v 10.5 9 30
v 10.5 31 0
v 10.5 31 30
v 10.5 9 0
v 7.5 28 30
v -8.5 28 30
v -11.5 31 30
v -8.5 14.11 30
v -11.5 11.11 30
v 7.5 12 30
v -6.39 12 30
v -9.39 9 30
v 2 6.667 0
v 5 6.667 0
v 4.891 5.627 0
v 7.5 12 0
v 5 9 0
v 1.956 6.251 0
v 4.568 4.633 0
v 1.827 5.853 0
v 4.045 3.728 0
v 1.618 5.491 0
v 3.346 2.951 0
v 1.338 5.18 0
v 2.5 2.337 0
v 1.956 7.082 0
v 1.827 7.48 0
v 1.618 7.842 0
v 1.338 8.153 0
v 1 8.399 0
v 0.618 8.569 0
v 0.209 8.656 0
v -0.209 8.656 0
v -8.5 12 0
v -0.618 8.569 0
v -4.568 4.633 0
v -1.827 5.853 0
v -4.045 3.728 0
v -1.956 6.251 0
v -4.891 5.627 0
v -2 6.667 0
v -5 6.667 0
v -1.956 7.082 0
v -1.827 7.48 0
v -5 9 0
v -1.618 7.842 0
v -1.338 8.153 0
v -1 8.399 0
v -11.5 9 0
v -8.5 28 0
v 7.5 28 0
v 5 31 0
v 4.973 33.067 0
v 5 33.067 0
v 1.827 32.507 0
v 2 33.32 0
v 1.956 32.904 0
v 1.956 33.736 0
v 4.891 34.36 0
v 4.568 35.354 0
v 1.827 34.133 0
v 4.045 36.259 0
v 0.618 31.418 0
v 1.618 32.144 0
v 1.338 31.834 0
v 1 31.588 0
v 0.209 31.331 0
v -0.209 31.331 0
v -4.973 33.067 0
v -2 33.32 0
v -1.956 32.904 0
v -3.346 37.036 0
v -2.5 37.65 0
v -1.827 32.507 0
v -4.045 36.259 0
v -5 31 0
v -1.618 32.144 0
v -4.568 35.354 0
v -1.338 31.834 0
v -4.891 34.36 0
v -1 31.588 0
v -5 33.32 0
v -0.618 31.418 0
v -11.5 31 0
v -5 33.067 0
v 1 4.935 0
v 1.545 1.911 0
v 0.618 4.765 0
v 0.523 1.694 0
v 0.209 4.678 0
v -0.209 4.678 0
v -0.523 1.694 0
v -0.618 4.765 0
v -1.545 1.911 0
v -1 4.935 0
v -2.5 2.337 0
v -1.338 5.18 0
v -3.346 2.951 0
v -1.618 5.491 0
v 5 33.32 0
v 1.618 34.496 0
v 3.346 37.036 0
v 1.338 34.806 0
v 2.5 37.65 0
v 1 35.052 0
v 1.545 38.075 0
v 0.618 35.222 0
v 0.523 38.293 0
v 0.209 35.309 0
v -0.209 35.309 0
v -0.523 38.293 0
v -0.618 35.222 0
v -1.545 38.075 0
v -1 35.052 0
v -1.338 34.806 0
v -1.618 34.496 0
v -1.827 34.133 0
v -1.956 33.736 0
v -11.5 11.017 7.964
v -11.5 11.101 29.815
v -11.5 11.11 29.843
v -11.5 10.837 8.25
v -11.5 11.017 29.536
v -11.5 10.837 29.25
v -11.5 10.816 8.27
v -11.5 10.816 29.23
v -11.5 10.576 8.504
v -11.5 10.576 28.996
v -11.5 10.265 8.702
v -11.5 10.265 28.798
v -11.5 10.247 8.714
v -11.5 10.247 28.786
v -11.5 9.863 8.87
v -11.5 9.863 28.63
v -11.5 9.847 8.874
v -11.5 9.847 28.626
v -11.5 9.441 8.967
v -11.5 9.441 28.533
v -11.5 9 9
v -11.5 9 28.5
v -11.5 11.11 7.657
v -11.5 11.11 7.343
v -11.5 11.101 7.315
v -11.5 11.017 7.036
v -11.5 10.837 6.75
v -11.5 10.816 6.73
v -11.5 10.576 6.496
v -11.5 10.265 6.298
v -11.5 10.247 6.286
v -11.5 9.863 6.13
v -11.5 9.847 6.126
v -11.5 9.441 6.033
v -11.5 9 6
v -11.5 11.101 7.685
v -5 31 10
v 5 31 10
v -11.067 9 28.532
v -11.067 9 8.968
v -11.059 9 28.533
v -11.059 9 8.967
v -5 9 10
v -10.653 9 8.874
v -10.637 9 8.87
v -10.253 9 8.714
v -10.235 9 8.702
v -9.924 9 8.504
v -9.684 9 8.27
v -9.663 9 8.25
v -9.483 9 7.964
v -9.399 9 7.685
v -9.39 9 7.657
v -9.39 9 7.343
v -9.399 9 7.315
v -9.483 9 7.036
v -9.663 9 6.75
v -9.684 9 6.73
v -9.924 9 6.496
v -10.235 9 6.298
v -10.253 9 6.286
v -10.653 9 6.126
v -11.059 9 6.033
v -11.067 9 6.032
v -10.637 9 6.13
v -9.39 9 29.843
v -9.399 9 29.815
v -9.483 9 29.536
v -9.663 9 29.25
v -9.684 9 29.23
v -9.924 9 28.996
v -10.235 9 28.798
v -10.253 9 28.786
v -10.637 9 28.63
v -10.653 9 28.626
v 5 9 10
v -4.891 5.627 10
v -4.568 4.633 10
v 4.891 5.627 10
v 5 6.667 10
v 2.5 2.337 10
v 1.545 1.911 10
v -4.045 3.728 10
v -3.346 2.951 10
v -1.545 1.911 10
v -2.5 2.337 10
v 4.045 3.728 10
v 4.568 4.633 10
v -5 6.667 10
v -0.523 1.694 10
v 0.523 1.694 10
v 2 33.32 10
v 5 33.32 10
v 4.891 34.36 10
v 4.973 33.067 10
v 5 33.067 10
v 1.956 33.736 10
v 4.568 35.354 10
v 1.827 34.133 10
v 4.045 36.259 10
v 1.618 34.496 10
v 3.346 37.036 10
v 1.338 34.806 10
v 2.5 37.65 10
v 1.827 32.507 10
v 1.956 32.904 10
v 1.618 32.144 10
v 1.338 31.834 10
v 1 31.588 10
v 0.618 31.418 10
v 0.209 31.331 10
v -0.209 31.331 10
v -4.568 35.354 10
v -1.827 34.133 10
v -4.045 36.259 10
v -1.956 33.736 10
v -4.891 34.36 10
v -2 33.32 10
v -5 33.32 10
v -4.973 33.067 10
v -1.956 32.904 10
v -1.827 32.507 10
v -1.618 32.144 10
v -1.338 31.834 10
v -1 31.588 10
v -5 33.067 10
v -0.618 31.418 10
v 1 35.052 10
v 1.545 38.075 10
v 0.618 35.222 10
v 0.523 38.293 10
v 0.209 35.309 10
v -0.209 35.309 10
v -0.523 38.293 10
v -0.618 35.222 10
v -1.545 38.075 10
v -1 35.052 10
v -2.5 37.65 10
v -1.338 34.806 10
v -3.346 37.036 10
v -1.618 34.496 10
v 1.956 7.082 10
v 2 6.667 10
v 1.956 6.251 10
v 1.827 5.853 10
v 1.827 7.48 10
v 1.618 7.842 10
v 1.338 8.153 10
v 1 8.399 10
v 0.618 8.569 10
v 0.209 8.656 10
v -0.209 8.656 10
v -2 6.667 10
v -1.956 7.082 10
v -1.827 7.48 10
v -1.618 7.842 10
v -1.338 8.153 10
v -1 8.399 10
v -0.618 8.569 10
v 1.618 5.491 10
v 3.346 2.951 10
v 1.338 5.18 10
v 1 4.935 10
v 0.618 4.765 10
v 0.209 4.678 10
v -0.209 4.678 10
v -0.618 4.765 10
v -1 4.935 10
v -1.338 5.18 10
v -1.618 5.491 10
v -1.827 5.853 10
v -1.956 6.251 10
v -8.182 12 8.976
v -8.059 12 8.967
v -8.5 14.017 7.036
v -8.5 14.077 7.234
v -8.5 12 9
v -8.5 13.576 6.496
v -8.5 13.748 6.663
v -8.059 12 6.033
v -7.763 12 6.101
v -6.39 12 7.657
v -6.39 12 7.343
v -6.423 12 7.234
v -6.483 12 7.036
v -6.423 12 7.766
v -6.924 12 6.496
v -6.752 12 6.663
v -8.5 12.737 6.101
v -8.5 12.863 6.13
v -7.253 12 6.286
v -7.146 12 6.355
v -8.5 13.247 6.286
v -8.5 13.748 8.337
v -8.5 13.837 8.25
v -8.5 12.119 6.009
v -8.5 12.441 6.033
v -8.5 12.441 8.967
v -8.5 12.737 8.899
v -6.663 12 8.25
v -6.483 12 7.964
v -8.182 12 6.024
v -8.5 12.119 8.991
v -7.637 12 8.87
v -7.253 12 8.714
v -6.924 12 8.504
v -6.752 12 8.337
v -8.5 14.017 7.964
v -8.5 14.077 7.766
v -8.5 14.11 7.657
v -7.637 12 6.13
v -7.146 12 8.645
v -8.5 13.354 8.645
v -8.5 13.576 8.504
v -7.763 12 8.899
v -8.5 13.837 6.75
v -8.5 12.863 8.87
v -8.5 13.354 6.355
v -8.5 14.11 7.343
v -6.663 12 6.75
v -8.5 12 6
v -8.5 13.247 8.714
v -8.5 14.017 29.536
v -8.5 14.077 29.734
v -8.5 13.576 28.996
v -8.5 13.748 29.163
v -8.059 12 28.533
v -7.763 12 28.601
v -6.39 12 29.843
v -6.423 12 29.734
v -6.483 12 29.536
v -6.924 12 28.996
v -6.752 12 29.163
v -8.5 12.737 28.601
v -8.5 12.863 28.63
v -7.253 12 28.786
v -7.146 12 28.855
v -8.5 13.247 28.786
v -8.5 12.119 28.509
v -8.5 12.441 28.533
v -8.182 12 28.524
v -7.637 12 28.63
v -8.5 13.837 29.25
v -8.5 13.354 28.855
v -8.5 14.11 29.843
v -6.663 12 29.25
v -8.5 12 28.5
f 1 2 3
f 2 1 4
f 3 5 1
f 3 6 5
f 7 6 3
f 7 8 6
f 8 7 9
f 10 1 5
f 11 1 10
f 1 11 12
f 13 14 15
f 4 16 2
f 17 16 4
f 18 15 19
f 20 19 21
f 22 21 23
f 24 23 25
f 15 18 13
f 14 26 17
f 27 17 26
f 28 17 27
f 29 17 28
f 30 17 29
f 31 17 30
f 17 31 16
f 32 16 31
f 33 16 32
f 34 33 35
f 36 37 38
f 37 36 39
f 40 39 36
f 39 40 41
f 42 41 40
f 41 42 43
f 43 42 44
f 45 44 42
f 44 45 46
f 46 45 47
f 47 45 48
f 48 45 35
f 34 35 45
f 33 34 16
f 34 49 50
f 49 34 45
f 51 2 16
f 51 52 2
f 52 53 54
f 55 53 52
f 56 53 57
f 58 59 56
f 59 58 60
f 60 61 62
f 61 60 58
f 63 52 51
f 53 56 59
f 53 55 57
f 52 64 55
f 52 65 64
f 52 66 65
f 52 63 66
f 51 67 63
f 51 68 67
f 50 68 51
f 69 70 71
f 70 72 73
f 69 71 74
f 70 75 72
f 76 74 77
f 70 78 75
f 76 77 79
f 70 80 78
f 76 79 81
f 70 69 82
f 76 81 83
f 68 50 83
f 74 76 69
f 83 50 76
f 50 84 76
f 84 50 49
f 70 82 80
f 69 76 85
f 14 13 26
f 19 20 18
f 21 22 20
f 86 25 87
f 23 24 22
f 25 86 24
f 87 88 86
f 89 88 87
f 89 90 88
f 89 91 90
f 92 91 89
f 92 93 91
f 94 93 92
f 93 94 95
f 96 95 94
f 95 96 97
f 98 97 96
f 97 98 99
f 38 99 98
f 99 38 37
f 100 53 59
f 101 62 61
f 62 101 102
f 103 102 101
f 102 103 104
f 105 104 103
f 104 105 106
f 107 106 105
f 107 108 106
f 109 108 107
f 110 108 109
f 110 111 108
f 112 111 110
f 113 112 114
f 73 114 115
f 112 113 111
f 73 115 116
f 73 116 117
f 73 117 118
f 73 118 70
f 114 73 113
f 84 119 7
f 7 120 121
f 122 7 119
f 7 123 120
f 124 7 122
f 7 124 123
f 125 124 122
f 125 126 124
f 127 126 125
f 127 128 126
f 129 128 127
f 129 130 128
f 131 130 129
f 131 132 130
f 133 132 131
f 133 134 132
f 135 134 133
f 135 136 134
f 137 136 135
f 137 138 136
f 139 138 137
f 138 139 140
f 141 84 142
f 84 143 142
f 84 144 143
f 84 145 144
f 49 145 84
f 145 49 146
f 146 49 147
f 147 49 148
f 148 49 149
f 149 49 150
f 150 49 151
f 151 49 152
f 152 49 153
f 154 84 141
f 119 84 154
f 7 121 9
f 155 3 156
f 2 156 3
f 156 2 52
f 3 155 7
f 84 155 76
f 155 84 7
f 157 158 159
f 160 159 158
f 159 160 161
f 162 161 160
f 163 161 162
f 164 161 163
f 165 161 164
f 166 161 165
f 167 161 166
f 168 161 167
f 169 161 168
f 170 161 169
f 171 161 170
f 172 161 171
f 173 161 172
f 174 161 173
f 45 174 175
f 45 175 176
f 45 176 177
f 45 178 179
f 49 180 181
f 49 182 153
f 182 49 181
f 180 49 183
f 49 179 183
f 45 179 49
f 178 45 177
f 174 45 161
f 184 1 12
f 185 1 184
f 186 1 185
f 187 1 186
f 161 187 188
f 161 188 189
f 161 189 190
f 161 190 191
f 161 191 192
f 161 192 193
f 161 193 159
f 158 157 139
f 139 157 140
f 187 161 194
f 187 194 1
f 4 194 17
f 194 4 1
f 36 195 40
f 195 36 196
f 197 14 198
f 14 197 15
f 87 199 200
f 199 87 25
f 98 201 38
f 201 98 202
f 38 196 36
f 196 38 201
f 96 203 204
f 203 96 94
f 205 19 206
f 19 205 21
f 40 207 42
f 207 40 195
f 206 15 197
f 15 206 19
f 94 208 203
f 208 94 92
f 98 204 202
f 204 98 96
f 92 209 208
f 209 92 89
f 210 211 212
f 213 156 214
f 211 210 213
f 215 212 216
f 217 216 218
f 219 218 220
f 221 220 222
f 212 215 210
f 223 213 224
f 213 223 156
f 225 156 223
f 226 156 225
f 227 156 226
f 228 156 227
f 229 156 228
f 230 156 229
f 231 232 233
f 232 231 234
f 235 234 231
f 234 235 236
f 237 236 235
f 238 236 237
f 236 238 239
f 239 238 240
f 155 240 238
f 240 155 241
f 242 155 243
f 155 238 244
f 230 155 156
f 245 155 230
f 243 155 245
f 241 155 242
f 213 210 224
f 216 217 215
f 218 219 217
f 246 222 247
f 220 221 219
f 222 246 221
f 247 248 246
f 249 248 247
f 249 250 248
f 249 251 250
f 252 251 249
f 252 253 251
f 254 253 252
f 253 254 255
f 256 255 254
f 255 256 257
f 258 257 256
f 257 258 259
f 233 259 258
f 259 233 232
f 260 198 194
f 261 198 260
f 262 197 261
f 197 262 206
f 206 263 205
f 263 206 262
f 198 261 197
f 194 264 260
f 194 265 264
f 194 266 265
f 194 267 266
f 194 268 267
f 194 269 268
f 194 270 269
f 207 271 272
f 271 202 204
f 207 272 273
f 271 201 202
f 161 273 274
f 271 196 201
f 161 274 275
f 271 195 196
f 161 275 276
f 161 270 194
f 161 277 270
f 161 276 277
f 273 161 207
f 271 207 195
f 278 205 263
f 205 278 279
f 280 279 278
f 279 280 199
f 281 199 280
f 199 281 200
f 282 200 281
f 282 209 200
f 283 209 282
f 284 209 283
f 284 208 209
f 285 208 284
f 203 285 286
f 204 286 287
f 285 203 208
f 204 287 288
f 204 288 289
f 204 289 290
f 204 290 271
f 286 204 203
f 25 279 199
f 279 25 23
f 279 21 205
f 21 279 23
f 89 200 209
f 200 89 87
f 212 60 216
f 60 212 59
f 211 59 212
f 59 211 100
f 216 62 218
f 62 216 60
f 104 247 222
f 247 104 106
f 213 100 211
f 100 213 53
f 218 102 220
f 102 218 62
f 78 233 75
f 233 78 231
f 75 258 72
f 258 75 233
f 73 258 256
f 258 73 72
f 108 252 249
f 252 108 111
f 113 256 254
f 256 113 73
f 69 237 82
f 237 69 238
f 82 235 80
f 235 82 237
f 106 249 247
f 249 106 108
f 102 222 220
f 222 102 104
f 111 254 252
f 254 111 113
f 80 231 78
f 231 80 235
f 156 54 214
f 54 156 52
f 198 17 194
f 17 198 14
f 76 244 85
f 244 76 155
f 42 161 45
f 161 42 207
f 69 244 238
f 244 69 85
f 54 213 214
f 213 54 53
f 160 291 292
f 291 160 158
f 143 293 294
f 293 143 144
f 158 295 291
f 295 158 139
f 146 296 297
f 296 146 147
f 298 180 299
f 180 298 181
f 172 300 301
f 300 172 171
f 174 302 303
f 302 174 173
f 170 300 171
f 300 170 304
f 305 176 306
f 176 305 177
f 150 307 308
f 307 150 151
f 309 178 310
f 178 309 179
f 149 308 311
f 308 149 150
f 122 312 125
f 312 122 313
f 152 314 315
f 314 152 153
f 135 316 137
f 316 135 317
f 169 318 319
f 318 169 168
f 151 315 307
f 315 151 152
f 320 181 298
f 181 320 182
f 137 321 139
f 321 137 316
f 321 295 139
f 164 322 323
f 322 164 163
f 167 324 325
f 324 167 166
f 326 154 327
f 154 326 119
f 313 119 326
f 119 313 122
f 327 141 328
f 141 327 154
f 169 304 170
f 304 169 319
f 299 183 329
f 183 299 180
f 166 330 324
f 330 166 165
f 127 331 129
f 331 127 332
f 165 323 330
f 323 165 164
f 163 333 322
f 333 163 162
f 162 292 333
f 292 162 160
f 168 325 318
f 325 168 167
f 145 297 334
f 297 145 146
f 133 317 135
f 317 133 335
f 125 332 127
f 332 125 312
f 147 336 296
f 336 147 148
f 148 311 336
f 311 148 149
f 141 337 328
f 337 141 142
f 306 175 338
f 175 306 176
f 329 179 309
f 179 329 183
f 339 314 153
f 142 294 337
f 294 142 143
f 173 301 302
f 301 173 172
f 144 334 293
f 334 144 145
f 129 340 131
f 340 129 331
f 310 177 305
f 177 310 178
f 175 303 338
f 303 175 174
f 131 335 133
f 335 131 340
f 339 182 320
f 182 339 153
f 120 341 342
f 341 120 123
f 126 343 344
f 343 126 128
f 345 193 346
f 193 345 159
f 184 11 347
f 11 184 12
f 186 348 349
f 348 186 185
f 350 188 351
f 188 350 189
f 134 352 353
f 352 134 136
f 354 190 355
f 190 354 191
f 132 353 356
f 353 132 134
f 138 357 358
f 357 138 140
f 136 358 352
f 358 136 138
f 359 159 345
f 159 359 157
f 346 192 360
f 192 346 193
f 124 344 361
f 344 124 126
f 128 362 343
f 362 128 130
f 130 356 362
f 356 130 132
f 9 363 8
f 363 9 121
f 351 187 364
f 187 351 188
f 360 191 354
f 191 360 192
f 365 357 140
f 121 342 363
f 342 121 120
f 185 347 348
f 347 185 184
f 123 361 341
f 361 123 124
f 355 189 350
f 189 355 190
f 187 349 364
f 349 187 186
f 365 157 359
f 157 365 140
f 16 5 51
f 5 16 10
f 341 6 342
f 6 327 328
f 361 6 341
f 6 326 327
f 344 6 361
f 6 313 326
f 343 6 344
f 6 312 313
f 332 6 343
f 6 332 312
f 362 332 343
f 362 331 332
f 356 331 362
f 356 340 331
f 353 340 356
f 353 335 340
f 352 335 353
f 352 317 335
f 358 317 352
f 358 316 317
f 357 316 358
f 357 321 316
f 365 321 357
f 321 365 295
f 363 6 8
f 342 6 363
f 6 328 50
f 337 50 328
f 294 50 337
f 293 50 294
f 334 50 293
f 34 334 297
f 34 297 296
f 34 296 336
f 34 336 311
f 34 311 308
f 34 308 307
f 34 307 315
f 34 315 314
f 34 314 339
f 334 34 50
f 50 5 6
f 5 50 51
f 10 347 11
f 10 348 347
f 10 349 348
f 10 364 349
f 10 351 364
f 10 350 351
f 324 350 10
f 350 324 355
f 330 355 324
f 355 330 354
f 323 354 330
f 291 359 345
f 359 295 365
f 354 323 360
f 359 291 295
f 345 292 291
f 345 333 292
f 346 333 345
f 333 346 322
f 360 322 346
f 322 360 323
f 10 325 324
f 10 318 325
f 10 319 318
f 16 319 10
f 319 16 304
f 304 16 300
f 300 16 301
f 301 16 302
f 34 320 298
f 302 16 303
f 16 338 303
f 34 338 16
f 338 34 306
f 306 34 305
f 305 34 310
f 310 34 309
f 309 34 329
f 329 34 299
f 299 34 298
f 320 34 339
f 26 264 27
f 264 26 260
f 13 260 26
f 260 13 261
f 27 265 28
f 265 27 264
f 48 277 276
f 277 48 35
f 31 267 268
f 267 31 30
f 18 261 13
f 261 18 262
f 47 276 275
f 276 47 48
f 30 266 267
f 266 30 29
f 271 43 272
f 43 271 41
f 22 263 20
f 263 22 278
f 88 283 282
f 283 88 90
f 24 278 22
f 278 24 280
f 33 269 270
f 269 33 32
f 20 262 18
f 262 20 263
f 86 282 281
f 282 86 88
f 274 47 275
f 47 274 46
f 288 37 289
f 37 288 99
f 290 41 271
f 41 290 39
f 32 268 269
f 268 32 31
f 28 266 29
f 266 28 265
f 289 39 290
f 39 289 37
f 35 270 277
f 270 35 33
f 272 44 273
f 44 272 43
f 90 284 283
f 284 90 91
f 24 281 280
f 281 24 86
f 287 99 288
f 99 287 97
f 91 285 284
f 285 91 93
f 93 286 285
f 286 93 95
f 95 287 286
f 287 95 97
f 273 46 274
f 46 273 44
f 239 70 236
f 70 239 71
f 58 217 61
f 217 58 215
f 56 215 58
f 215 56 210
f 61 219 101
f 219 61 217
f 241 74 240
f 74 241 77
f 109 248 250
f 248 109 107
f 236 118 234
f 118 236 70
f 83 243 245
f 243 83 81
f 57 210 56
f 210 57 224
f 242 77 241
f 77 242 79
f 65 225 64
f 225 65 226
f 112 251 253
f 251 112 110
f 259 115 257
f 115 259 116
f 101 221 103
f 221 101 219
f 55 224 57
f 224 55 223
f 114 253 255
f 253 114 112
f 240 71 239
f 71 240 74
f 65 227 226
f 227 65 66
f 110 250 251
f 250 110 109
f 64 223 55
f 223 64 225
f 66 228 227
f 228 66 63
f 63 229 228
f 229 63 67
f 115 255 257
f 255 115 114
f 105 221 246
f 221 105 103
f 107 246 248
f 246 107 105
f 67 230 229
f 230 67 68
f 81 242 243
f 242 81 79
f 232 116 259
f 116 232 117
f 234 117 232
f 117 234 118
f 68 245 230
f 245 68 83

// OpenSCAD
// file: config.scad
//This REALLY REALLY needs to get organized. I will start sorting through it ASAP 

//Vars for the fram vertex. This is still kind of confusing. File is broke sometimes. I would watch this in preview before trusting these values.
framerodsize = 8.5;
framerodtap =7; // we use this one in the y motor for the top rod that gets tapped as well
vertexwall = 3;
vertexthick = framerodsize*2 + vertexwall*2; // I would say leave this alone. 
triangle= 60;
mirror=false;

// vars for the y motor mount
vertexhole = 8; //the diameter of the vertex hole in whosawhatasis vertex. Really important these values match.
partthick =9;
wallmulti = 2; //the wall thickness multiplier
motorwallmulti = 2.3; //multiplier for the motor holes because you might want them thicker
centerwallmulti = 1.5; //multiplier for the center hole because you might want them thinner
nemasize = 1.7;
motorscrew = 4; //diameter of the motor attachment screw
motorcenter = 24; //center hole size for the motor

//Top piece vars
nemasize= 1.7;
motorwallmulti= 1.9;
motorscrew = 4;
motorcenter= 23;
centerwallmulti = 1.7;
motorbody = 43;

partthick = 8;
toprodbefore =7;
toproddia = 8.5;
toprodwall = 4;
toprodspacing = 72;
siderodtap = 7;
sideroddia = 8;
siderodwall = 4;
angle = 60;

zsmoothdia =8;

xrodspacing = 55; //rod spacing center to center
xroddia = 8; //rod diamter
nemasize = 1.7;
znutdia = 14.8;
znuth = 7; //znut height
zroddia = 8;
nutwall = 3; //wall thickness
zbeforetapdia = 7.5; 
bushingod = 16;
bushingtower =xroddia+nutwall*sin(45)+xrodspacing ;
towergap= 10;
wallmulti = 1.5;
motorwallmulti = 1.7;
motorscrew =4;
partthick = 7.5; //thickness of the motor mount
centerwallmulti = 1.5; // center motor hole multi
motorcenter = 24;
supportwidth = 17;
$fn = 30;

//xcarriage 
carriagewidth = 60;
bushingwall = 3;
backwall = 5;
tools = 2;
tool1dia = 16;
tool2dia = 16;
adapterholedia = 4;
platformthick = 10;
platformextension = 40; 
pulleydia = 12;
beltthick = 2;
clampthick = 4;
clampholedia = 4;

//pen holder 
penwall = 3 ;
holdingscrewdia = 3;
shaftheight = 30;
// main file
include <config.scad>;

difference(){
union(){
translate([-adapterholedia/2-tool1dia/2-penwall/2,platformextension/2-tool1dia/2-penwall,0])cube([tool1dia+penwall*2,tool1dia+penwall*2,shaftheight]);
translate([0,platformextension/6,0])cylinder(r=adapterholedia/2 + penwall,h=platformthick);
translate([0,platformextension*0.833,0])cylinder(r=adapterholedia/2 + penwall,h=platformthick);
translate([-adapterholedia/2-penwall,platformextension/6,0])cube([adapterholedia+penwall*2,platformextension*0.66,platformthick]);

}
translate([-adapterholedia/2-tool1dia/2-penwall/2,platformextension/2-tool1dia/2-penwall,shaftheight/4])rotate([0,-90,-135])cylinder(r=holdingscrewdia/2, h = tool1dia);
translate([-adapterholedia/2-tool1dia/2-penwall/2,platformextension/2-tool1dia/2-penwall,shaftheight])rotate([0,-90,-135])cylinder(r=holdingscrewdia/2, h = tool1dia);
translate([-adapterholedia/2-tool1dia/2+penwall/2,platformextension/2-tool1dia/2,0])cube([tool1dia,tool1dia,shaftheight]);
translate([0,platformextension/6,-1])cylinder(r=adapterholedia/2,h=platformthick+2);
translate([0,platformextension*0.833,-1])cylinder(r=adapterholedia/2,h=platformthick+2);
}
